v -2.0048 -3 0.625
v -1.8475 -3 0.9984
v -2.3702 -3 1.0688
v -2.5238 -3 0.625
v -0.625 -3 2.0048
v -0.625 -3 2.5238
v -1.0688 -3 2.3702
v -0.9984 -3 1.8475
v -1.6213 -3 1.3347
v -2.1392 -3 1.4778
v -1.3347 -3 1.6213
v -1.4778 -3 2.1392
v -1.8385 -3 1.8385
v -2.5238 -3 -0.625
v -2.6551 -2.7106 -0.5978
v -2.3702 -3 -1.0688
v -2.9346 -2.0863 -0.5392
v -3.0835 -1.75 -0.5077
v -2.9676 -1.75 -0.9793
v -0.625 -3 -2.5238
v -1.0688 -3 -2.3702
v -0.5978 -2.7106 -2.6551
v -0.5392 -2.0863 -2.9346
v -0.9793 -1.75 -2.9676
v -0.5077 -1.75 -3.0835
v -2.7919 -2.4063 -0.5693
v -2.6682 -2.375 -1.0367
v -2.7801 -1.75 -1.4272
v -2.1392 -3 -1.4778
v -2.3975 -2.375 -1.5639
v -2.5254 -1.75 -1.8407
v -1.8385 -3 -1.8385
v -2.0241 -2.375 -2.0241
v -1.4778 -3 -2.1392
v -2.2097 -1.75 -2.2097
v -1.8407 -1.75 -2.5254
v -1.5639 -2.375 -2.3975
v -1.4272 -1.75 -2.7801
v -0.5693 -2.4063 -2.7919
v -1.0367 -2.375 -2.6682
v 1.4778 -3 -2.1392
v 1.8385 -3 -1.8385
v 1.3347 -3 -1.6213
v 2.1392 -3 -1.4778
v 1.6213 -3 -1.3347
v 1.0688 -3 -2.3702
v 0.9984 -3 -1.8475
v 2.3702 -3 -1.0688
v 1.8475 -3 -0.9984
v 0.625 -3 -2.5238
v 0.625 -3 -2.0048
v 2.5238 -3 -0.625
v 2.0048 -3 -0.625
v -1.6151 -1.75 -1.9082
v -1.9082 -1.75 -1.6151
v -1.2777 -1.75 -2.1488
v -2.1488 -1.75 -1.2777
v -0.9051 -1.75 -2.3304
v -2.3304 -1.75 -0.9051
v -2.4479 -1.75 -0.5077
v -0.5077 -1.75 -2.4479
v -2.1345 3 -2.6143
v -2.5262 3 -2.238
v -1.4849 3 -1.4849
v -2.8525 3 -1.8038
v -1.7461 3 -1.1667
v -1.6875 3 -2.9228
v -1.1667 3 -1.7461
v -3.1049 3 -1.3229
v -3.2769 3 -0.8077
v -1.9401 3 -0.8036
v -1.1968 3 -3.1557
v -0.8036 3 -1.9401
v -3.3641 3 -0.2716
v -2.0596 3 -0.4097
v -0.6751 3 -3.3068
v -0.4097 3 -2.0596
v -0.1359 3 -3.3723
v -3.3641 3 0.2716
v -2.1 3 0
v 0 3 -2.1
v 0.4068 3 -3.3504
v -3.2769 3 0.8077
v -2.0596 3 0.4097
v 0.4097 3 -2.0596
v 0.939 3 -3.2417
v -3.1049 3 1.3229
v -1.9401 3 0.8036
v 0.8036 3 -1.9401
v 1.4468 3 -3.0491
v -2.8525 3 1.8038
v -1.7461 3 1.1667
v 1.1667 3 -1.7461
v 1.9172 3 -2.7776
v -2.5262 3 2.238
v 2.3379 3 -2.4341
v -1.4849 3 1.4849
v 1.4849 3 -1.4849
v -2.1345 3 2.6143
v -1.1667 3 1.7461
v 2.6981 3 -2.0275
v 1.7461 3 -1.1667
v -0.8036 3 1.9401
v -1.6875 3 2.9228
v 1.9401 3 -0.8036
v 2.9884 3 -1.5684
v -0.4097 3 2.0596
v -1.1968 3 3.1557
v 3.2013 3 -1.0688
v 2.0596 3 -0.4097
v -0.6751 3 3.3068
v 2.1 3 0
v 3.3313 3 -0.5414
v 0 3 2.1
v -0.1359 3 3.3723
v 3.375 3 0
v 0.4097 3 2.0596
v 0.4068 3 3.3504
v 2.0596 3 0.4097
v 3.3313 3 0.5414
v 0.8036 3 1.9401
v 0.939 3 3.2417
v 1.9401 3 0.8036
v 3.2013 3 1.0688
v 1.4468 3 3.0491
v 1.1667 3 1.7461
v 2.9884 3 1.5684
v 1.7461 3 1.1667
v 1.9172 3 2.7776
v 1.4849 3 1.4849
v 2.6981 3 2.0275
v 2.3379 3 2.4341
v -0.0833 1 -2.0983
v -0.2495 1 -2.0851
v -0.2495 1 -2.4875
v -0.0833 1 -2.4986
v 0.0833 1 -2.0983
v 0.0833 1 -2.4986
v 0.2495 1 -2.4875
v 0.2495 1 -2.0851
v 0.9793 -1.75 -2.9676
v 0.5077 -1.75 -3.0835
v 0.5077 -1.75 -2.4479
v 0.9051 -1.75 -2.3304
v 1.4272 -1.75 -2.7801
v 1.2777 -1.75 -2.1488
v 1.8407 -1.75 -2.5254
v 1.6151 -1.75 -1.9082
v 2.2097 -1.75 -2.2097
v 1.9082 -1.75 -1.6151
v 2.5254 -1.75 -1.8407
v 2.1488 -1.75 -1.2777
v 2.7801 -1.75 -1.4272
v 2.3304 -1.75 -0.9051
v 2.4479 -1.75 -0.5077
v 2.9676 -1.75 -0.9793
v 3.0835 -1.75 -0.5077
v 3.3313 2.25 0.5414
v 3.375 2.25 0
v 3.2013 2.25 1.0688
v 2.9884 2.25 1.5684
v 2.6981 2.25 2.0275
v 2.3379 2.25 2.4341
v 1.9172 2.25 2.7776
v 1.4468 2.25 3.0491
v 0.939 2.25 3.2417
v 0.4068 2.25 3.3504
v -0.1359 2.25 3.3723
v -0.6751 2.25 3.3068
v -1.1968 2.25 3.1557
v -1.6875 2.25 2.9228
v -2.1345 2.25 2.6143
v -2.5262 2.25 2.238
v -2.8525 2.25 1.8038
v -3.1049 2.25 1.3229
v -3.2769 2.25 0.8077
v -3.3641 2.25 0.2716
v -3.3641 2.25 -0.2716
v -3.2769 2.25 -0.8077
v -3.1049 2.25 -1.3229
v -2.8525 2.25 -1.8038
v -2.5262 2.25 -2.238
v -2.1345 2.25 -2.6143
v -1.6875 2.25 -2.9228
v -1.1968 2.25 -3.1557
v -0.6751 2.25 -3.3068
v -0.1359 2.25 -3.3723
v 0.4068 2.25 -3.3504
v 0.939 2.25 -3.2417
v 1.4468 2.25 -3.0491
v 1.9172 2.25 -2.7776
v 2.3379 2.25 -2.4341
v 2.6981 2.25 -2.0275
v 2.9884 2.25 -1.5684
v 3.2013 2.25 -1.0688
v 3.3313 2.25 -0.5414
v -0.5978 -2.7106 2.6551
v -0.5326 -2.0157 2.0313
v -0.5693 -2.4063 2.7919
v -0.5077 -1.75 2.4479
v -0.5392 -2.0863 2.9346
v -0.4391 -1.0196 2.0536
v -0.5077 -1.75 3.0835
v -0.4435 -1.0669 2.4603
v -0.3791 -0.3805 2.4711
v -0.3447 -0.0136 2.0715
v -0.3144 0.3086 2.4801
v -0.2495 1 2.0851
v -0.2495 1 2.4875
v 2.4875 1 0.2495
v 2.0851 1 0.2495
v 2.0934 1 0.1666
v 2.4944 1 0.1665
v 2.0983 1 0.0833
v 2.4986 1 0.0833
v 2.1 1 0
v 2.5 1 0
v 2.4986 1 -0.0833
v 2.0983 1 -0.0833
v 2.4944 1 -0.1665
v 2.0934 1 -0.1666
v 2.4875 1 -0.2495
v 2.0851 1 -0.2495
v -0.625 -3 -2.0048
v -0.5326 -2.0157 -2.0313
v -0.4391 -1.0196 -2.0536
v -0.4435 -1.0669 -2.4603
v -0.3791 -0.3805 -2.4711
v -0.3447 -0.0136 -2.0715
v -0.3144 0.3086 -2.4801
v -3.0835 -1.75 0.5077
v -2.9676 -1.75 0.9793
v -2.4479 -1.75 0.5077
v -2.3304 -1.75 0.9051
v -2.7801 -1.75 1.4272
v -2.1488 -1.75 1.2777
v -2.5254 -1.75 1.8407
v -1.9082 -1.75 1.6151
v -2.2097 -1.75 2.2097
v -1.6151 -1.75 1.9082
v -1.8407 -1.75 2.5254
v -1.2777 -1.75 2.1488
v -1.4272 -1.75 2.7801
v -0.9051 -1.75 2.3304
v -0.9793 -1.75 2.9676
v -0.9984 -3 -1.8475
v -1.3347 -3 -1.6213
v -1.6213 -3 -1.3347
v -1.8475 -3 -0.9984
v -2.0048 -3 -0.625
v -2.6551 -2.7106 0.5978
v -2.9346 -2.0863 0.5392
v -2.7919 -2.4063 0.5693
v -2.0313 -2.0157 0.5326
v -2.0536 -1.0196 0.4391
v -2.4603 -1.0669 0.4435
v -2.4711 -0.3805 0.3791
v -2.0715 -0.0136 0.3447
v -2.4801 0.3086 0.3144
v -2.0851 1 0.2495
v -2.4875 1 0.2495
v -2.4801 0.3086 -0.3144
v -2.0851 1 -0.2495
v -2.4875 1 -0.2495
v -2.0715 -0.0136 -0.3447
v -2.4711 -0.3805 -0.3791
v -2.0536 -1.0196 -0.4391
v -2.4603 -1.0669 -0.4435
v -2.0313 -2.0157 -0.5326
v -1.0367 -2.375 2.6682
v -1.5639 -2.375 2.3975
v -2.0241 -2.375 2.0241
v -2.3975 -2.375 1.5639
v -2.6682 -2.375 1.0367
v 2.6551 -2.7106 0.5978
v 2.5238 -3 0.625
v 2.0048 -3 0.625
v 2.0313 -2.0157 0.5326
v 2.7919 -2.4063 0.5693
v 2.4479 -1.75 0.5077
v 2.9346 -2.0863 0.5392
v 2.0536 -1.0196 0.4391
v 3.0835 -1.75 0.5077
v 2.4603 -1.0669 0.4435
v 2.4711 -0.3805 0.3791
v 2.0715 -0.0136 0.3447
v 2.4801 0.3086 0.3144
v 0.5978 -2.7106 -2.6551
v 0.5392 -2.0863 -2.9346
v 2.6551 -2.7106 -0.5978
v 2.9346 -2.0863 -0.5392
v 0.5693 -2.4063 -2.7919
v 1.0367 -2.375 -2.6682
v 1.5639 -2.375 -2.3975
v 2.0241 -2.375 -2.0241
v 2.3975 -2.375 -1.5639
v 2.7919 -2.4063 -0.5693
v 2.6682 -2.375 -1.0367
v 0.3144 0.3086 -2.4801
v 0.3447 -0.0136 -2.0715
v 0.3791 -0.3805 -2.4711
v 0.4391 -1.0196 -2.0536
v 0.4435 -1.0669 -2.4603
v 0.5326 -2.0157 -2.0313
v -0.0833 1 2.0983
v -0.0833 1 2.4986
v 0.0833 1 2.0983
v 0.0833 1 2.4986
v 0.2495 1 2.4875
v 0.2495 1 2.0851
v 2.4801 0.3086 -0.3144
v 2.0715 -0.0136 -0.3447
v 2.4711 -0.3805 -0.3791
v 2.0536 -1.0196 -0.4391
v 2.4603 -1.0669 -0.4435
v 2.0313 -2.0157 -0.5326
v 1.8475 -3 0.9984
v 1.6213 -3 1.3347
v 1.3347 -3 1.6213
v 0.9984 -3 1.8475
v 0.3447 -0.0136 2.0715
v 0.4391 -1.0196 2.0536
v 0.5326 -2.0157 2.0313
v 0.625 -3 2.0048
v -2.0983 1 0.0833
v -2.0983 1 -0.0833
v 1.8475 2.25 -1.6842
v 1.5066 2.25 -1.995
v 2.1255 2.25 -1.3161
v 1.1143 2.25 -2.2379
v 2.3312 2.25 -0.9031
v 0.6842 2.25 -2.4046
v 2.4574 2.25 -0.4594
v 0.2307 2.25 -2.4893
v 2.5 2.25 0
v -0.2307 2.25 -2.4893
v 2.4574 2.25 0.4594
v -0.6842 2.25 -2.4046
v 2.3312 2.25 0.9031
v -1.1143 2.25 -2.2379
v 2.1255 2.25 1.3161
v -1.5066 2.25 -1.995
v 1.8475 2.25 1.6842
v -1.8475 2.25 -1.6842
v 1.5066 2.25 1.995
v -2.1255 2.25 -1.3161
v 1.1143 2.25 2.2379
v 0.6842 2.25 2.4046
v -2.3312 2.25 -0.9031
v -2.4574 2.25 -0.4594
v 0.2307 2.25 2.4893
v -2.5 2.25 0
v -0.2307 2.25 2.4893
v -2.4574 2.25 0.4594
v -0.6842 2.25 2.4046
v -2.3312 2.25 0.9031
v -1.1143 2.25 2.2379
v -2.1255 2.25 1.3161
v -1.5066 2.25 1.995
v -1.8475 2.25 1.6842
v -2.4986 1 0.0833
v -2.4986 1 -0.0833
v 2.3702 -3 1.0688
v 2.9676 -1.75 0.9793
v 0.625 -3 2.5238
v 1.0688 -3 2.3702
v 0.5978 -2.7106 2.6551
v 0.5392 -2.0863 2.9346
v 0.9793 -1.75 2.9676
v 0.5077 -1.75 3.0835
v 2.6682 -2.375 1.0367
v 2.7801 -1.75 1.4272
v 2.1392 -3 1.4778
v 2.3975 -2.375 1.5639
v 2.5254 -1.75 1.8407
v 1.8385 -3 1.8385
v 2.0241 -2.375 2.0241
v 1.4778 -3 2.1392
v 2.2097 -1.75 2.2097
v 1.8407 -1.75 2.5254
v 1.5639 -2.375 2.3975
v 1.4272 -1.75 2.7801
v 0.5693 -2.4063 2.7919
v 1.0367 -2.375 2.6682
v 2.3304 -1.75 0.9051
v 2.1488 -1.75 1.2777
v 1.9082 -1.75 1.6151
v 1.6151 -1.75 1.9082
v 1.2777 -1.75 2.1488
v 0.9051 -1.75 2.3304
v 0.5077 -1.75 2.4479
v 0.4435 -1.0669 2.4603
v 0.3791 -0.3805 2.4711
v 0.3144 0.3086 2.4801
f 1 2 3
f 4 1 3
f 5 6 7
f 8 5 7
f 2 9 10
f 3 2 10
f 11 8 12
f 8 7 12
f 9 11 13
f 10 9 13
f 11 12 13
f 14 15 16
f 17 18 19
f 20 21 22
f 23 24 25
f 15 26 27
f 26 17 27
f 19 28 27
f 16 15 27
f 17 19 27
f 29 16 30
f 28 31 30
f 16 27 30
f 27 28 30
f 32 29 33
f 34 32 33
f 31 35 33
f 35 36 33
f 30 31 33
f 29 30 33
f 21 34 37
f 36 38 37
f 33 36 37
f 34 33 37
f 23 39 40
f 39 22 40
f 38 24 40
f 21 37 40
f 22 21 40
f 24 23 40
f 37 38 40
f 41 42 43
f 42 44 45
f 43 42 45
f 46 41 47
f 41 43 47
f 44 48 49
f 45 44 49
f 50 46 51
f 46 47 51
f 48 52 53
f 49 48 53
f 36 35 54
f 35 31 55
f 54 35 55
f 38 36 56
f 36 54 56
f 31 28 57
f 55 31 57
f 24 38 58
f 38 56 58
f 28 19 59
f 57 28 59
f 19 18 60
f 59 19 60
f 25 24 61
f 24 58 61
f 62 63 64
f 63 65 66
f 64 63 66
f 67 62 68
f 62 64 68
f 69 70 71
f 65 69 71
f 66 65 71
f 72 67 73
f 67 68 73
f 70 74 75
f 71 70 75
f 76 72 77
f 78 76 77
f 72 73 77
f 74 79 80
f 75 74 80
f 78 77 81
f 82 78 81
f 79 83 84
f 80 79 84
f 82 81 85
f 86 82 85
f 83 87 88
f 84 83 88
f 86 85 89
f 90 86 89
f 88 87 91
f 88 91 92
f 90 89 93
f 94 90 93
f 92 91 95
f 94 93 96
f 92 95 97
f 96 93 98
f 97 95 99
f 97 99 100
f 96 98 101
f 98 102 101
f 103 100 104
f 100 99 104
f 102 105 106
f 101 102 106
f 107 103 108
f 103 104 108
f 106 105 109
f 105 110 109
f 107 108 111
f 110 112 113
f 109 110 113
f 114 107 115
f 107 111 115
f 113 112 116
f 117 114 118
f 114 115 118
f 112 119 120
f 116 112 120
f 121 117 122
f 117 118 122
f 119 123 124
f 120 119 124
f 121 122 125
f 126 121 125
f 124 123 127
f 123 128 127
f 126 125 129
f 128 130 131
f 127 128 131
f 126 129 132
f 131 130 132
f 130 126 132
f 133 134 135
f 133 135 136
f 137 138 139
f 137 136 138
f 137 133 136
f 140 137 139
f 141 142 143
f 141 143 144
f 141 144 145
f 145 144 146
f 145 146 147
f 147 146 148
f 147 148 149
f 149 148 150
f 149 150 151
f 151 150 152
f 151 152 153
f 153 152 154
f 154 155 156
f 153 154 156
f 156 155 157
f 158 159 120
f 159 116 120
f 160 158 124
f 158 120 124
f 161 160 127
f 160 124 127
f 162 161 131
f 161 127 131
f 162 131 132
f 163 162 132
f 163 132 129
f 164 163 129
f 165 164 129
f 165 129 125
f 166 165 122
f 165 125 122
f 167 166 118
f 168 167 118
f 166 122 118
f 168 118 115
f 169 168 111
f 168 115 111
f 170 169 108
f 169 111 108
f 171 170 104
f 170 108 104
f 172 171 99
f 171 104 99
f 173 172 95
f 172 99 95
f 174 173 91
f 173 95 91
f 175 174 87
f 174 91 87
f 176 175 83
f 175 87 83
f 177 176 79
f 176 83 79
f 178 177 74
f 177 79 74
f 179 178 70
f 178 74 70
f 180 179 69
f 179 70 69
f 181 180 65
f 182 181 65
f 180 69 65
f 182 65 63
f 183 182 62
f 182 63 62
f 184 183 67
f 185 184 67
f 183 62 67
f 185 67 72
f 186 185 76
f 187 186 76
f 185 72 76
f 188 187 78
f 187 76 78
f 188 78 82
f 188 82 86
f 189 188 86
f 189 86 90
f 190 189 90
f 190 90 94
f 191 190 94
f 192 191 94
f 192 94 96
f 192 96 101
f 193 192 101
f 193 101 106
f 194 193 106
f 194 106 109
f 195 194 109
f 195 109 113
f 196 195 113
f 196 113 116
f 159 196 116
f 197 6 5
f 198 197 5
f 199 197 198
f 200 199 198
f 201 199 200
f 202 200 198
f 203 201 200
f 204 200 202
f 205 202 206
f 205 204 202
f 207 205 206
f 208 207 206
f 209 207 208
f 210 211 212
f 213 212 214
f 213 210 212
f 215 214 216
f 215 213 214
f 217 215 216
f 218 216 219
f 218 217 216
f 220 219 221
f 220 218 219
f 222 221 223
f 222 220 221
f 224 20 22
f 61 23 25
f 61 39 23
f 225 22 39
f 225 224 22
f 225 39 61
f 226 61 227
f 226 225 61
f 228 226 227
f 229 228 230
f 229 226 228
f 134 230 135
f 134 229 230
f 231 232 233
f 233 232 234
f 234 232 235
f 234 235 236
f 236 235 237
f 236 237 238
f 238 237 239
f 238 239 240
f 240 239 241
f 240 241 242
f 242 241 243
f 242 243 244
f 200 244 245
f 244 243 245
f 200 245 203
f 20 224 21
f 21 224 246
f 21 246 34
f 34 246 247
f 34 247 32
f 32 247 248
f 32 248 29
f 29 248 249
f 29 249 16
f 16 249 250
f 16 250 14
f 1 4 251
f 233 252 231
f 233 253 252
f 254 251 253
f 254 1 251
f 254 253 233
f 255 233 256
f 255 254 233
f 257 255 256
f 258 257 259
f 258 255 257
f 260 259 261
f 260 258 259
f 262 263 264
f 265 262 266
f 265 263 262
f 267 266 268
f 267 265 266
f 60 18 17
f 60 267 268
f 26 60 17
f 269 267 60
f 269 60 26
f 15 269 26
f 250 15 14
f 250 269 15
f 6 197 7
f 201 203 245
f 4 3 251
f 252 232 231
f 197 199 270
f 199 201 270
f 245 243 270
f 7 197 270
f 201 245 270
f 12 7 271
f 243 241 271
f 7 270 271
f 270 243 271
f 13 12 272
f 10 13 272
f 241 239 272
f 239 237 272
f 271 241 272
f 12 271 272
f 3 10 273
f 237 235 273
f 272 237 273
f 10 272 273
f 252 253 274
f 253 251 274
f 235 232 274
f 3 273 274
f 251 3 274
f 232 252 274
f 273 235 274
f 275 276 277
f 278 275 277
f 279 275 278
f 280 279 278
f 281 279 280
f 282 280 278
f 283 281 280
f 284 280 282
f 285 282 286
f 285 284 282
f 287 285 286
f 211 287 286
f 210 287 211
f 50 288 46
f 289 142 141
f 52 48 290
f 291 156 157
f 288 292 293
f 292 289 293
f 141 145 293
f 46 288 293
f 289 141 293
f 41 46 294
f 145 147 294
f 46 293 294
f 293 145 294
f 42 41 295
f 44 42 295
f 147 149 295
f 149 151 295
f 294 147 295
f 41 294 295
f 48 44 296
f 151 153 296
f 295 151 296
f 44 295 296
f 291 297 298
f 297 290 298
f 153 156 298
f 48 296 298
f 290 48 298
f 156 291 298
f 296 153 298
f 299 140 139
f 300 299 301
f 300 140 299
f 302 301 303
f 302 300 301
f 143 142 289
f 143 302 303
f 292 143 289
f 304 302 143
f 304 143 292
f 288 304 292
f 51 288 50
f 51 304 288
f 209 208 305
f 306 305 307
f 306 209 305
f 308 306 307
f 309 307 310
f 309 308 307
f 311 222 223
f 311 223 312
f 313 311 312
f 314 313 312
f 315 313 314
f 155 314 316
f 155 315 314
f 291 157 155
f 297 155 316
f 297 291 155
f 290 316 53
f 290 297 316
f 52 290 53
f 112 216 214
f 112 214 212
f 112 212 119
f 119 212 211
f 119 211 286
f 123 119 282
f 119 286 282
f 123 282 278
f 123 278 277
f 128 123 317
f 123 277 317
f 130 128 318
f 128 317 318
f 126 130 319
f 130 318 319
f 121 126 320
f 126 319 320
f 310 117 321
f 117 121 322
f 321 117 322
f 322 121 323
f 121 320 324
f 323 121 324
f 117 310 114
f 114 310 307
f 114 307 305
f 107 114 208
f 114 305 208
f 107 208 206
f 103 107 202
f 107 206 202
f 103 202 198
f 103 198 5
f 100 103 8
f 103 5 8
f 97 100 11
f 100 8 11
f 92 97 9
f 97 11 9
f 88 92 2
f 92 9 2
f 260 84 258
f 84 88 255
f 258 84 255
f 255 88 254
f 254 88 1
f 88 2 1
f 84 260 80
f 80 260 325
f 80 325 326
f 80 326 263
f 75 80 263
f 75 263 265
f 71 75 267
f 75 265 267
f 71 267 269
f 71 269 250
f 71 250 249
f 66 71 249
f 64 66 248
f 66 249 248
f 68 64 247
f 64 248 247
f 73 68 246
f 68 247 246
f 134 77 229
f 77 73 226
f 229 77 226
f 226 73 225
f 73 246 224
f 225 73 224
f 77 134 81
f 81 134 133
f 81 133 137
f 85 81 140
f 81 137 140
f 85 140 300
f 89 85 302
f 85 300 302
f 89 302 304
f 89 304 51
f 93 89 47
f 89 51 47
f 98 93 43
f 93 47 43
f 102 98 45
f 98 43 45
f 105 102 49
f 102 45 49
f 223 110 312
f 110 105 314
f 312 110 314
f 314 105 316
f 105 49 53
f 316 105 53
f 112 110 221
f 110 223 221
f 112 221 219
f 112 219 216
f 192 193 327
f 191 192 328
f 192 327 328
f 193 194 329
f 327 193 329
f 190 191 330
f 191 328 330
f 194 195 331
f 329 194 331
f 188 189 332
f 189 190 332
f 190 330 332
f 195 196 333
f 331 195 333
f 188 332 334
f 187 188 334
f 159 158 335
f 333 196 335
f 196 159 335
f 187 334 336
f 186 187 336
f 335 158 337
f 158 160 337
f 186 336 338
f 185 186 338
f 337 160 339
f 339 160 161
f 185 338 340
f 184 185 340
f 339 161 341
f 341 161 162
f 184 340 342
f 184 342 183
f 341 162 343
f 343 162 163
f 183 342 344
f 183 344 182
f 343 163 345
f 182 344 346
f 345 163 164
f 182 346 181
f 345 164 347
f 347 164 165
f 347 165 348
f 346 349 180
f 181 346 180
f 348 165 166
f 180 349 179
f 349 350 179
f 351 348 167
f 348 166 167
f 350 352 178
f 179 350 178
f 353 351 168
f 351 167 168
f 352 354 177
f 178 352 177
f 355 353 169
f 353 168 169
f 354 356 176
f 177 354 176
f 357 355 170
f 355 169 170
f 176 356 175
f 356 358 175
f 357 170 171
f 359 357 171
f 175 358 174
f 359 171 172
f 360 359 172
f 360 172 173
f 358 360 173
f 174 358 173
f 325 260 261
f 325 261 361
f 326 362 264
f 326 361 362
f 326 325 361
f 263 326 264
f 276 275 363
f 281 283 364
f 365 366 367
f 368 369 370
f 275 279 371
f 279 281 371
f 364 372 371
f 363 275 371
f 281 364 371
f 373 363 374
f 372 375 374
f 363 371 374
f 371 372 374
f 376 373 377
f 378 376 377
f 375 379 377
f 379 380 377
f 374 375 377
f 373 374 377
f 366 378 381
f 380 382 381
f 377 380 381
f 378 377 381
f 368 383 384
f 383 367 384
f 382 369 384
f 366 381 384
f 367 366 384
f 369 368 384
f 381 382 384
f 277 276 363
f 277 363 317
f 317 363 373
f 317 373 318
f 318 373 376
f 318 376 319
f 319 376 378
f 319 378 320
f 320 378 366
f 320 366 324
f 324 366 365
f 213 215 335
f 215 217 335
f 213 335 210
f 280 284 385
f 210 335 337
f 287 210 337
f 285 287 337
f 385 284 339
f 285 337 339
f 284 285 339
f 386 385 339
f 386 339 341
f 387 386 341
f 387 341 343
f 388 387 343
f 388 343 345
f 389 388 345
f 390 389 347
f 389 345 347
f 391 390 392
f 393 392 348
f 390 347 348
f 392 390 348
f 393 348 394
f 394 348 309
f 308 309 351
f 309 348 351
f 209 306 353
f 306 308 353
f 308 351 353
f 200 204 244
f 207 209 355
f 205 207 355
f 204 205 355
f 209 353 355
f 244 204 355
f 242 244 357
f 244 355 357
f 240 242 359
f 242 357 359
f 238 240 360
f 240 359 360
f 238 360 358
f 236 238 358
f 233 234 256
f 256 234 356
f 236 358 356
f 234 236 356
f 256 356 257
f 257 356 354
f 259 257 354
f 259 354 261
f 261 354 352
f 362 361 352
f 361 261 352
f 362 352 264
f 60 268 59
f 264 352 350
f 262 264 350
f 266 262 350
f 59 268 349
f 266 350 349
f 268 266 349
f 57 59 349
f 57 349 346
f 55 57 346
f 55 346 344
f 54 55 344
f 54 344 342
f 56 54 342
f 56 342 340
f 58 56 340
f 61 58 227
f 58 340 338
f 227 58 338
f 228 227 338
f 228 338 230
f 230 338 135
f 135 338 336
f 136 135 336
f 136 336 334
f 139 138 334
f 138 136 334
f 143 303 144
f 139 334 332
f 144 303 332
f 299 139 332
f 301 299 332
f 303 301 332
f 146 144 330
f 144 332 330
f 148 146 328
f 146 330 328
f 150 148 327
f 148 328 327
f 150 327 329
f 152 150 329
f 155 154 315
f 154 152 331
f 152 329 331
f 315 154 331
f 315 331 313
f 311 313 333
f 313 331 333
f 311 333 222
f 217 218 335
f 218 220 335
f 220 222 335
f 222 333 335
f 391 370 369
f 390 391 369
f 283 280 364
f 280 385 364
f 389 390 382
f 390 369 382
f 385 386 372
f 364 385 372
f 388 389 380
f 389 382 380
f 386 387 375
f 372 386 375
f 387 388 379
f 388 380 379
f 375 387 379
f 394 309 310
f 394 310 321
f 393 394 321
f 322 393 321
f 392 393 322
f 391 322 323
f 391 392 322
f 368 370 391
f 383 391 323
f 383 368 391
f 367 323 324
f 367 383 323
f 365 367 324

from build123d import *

# Parameters (mm, degrees)
CUT_EXTRUDE1_DEPTH = 4.375
CIRPATTERN1_COUNT  = 4


with BuildPart() as part:
    # Sketch1 → Revolve1 (revolve)
    with BuildSketch(Plane.XY):
        Polygon((2.1, 3), (2.1, -3), (2.6, -3), (3.125, -1.75), (2.5, -1.75), (2.5, 2.25), (3.375, 2.25), (3.375, 3), align=None)
    revolve(axis=Axis((0, 3, 0), (0, -1, 0)))

    # Sketch2 → Cut-Extrude1 (cut, symmetric)
    with BuildSketch(Plane.XY):
        Polygon((-0.249514725, 1), (0.249514725, 1), (0.625, -3), (-0.625, -3), align=None)
    cut_extrude1 = extrude(amount=CUT_EXTRUDE1_DEPTH, both=True, mode=Mode.SUBTRACT)

    # CirPattern1: Cut-Extrude1 ×4 about axis
    cirpattern1_axis = Axis((0, 3, 0), (0, 1, 0))
    for i in range(1, CIRPATTERN1_COUNT):
        add(cut_extrude1.rotate(cirpattern1_axis, i * 360 / CIRPATTERN1_COUNT), mode=Mode.SUBTRACT)


solid = part.part
